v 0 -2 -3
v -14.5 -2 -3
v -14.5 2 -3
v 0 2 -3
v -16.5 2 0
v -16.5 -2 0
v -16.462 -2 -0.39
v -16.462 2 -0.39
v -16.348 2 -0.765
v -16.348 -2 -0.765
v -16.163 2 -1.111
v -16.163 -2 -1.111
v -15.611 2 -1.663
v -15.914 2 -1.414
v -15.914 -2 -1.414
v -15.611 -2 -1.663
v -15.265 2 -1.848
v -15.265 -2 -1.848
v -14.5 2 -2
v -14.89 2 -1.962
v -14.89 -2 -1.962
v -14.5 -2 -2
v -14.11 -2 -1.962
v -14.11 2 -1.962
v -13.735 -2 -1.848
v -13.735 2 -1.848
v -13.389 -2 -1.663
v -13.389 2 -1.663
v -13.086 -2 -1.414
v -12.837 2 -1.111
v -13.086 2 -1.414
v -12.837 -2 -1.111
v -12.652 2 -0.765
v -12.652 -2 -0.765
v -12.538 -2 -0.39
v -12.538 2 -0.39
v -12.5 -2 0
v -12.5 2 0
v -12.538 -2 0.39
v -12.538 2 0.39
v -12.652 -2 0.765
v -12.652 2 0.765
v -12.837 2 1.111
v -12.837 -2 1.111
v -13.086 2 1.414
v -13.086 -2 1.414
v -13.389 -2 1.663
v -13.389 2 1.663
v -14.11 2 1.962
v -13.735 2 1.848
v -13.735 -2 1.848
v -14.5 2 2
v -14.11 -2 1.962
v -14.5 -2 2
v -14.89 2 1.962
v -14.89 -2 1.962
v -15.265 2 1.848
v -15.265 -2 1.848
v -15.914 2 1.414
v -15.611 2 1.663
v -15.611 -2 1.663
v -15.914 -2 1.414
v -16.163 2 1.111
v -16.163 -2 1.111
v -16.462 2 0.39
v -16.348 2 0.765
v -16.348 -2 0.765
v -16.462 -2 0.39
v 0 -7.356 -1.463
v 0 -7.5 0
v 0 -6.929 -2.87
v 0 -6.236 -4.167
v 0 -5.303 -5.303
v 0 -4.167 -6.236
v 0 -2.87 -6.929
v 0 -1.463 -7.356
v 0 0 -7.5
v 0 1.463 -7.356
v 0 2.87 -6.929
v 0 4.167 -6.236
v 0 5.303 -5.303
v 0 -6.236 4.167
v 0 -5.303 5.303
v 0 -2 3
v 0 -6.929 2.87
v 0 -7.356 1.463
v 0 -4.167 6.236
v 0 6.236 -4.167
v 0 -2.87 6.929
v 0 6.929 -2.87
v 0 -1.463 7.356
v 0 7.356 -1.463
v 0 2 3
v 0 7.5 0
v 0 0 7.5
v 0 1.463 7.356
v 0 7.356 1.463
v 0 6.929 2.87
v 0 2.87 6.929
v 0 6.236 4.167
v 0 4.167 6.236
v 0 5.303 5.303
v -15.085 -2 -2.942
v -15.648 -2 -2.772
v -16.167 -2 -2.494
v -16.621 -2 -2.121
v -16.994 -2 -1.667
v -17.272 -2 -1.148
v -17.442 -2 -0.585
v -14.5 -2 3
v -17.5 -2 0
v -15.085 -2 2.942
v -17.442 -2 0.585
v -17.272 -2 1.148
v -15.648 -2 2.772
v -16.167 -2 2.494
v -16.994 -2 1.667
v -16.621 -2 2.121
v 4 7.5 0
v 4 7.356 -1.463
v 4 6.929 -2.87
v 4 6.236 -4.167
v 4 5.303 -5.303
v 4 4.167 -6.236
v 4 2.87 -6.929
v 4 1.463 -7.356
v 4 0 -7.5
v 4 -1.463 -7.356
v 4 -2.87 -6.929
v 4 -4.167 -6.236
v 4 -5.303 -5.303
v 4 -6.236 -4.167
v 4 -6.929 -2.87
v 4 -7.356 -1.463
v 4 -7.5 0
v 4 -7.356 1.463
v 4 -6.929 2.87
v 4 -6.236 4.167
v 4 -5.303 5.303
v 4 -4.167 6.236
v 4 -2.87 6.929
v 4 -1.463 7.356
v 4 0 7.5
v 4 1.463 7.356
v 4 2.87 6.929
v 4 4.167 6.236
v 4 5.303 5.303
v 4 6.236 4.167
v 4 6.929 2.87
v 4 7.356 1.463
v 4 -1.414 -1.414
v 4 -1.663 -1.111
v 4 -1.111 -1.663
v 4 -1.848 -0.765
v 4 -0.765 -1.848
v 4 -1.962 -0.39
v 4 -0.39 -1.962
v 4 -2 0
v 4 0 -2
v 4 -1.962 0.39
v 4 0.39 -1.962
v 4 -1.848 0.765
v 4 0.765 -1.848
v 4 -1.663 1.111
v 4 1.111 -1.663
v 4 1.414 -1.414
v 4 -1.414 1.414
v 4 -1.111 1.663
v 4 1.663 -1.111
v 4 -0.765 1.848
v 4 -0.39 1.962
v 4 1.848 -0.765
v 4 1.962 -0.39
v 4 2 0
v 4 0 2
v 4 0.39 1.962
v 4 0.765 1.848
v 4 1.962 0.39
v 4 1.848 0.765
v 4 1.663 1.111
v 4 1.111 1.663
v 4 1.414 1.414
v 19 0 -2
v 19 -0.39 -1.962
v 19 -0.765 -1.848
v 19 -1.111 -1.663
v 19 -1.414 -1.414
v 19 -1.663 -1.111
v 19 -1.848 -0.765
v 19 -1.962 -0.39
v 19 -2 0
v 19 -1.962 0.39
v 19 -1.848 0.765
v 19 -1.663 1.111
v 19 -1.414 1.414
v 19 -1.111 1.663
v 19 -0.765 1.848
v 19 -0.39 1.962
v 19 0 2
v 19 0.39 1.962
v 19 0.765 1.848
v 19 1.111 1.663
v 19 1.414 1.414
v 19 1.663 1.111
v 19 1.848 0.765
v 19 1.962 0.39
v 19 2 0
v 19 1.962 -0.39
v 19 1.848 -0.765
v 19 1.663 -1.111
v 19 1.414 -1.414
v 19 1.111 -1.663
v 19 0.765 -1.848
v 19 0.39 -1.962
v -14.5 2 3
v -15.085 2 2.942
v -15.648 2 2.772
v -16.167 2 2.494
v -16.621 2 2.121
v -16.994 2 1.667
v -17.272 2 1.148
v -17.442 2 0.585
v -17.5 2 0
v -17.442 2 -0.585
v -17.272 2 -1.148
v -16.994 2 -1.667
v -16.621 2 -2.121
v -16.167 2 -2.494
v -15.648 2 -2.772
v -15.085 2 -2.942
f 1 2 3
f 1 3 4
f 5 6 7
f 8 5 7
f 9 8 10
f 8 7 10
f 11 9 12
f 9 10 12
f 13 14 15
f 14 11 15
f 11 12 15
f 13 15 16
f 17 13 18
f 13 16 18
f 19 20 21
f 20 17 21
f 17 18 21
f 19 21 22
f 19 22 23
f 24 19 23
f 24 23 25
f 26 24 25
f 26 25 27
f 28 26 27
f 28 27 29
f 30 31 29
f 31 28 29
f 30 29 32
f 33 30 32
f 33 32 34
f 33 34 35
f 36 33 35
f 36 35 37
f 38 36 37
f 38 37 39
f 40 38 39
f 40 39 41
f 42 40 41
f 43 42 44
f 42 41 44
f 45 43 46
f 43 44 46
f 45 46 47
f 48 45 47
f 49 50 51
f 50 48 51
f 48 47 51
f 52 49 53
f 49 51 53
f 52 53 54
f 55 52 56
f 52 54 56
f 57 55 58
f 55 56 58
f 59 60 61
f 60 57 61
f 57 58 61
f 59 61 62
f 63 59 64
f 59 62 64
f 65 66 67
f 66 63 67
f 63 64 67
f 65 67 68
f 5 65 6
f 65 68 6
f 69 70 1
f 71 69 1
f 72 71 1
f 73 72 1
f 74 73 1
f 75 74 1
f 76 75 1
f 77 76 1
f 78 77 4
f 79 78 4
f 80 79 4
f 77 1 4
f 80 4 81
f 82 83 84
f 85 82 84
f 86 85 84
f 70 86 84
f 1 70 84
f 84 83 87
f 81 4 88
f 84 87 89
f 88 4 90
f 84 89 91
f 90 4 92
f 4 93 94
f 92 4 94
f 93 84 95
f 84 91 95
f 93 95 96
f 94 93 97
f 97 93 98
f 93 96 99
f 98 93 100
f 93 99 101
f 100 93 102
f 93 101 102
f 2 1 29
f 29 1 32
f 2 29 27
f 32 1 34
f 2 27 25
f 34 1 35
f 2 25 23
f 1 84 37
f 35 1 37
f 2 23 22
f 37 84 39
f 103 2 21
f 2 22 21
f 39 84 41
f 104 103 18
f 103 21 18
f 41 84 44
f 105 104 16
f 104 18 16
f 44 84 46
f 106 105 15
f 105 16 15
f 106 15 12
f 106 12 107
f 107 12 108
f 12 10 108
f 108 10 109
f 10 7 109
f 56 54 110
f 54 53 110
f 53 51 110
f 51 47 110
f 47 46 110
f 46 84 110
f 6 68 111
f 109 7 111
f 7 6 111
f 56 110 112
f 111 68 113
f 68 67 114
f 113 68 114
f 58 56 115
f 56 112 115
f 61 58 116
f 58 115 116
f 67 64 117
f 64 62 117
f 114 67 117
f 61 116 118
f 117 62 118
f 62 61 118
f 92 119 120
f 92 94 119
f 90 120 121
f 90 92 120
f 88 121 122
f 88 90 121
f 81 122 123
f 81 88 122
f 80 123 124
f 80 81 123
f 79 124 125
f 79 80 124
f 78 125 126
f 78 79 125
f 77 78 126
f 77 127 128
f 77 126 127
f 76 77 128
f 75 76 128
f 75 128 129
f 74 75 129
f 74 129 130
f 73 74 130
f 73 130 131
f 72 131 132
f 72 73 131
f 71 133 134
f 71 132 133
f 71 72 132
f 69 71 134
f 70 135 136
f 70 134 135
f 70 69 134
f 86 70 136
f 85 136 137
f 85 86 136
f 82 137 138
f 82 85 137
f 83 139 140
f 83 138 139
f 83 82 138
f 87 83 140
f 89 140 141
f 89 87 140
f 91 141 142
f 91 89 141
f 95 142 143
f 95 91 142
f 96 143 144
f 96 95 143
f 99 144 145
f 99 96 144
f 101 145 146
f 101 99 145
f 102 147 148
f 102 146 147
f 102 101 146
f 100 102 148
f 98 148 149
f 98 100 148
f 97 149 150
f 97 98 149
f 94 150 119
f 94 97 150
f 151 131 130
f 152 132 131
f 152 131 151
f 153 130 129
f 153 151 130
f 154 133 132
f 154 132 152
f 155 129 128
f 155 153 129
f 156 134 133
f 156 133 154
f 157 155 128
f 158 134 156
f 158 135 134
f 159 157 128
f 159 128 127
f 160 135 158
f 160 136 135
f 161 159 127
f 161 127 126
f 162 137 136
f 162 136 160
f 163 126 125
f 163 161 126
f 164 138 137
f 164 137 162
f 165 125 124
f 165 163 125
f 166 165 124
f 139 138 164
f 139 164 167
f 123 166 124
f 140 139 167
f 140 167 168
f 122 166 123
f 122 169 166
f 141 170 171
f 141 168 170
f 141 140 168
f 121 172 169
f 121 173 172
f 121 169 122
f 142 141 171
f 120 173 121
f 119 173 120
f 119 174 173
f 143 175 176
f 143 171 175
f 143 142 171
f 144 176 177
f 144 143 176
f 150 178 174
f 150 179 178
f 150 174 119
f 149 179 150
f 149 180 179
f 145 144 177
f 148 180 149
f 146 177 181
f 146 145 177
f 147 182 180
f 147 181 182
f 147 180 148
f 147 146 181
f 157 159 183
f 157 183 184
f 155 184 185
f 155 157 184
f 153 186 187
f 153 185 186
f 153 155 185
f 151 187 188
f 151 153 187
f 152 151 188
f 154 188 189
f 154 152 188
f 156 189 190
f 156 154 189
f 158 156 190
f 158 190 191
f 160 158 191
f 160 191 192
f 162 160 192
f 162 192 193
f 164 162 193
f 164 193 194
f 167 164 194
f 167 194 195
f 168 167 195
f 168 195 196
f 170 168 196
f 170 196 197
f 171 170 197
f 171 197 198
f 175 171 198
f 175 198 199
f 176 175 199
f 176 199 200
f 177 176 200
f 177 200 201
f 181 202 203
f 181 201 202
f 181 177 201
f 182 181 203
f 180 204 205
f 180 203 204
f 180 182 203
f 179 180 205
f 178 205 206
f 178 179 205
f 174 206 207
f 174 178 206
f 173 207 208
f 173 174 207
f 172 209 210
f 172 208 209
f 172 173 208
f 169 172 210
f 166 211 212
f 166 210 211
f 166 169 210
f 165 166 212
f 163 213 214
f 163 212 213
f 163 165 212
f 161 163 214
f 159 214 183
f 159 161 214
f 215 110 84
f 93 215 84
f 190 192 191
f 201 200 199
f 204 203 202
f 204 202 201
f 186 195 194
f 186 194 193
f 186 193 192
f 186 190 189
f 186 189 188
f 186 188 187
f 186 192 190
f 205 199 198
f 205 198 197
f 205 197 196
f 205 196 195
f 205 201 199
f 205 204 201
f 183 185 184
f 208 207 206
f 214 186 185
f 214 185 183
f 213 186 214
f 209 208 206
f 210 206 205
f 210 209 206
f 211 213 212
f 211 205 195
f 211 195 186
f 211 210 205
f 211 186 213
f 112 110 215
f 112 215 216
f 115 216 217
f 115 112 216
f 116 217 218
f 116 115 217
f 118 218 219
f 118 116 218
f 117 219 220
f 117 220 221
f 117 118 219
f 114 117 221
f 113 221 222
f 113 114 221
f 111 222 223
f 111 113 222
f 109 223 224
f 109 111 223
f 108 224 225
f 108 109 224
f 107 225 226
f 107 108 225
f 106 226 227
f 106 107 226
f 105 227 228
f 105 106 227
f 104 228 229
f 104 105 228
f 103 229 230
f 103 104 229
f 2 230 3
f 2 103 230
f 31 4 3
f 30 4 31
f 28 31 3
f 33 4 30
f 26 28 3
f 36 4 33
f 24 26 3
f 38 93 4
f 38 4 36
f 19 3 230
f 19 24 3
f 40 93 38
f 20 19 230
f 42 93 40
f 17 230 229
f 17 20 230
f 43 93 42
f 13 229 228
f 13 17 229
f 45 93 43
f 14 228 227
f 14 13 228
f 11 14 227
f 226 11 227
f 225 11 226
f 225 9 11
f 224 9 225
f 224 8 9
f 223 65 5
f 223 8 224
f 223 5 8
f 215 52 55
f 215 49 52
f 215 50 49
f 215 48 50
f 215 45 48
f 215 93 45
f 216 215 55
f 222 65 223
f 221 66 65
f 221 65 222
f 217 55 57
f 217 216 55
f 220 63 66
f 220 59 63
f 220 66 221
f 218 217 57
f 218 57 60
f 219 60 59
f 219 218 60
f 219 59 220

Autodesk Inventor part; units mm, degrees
ref_plane "YZ Plane" through (0, 0, 0) normal (1, 0, 0) x (0, 1, 0)
ref_plane "XZ Plane" through (0, 0, 0) normal (0, 1, 0) x (-1, 0, 0)
ref_plane "XY Plane" through (0, 0, 0) normal (0, 0, 1) x (1, 0, 0)
sketch "スケッチ1" plane through (0, 0, 0) normal (1, 0, 0) x (0, 1, 0)
  circle A0 centre (0, 0) radius 7.5
  dimension "d0" = 15
extrude "押し出し1" add sketch "スケッチ1" along normal blind 4
sketch "スケッチ2" plane through (0, 0, 0) normal (0, 1, 0) x (-1, 0, 0)
  circle A0 centre (14.5, 0) radius 2
  circle A1 centre (14.5, 0) radius 3
  line L0 (14.5, -3) -> (0, -3)
  line L1 (0, 7.5) -> (0, -7.5) projected
  line L2 (14.5, 3) -> (0, 3)
  point P0 (0, 0)
  dimension "d3" = 4
  dimension "d4" = 6
  dimension "d5" = 14.5
extrude "押し出し2" add sketch "スケッチ2" along normal mid plane 4
sketch "スケッチ3" plane through (4, 0, 0) normal (1, 0, 0) x (0, 0, -1)
  circle A0 centre (0, 0) radius 2
  dimension "d8" = 4
extrude "押し出し3" add sketch "スケッチ3" along normal blind 15
properties part number "black-suspension-top" material "ABS プラスチック"
